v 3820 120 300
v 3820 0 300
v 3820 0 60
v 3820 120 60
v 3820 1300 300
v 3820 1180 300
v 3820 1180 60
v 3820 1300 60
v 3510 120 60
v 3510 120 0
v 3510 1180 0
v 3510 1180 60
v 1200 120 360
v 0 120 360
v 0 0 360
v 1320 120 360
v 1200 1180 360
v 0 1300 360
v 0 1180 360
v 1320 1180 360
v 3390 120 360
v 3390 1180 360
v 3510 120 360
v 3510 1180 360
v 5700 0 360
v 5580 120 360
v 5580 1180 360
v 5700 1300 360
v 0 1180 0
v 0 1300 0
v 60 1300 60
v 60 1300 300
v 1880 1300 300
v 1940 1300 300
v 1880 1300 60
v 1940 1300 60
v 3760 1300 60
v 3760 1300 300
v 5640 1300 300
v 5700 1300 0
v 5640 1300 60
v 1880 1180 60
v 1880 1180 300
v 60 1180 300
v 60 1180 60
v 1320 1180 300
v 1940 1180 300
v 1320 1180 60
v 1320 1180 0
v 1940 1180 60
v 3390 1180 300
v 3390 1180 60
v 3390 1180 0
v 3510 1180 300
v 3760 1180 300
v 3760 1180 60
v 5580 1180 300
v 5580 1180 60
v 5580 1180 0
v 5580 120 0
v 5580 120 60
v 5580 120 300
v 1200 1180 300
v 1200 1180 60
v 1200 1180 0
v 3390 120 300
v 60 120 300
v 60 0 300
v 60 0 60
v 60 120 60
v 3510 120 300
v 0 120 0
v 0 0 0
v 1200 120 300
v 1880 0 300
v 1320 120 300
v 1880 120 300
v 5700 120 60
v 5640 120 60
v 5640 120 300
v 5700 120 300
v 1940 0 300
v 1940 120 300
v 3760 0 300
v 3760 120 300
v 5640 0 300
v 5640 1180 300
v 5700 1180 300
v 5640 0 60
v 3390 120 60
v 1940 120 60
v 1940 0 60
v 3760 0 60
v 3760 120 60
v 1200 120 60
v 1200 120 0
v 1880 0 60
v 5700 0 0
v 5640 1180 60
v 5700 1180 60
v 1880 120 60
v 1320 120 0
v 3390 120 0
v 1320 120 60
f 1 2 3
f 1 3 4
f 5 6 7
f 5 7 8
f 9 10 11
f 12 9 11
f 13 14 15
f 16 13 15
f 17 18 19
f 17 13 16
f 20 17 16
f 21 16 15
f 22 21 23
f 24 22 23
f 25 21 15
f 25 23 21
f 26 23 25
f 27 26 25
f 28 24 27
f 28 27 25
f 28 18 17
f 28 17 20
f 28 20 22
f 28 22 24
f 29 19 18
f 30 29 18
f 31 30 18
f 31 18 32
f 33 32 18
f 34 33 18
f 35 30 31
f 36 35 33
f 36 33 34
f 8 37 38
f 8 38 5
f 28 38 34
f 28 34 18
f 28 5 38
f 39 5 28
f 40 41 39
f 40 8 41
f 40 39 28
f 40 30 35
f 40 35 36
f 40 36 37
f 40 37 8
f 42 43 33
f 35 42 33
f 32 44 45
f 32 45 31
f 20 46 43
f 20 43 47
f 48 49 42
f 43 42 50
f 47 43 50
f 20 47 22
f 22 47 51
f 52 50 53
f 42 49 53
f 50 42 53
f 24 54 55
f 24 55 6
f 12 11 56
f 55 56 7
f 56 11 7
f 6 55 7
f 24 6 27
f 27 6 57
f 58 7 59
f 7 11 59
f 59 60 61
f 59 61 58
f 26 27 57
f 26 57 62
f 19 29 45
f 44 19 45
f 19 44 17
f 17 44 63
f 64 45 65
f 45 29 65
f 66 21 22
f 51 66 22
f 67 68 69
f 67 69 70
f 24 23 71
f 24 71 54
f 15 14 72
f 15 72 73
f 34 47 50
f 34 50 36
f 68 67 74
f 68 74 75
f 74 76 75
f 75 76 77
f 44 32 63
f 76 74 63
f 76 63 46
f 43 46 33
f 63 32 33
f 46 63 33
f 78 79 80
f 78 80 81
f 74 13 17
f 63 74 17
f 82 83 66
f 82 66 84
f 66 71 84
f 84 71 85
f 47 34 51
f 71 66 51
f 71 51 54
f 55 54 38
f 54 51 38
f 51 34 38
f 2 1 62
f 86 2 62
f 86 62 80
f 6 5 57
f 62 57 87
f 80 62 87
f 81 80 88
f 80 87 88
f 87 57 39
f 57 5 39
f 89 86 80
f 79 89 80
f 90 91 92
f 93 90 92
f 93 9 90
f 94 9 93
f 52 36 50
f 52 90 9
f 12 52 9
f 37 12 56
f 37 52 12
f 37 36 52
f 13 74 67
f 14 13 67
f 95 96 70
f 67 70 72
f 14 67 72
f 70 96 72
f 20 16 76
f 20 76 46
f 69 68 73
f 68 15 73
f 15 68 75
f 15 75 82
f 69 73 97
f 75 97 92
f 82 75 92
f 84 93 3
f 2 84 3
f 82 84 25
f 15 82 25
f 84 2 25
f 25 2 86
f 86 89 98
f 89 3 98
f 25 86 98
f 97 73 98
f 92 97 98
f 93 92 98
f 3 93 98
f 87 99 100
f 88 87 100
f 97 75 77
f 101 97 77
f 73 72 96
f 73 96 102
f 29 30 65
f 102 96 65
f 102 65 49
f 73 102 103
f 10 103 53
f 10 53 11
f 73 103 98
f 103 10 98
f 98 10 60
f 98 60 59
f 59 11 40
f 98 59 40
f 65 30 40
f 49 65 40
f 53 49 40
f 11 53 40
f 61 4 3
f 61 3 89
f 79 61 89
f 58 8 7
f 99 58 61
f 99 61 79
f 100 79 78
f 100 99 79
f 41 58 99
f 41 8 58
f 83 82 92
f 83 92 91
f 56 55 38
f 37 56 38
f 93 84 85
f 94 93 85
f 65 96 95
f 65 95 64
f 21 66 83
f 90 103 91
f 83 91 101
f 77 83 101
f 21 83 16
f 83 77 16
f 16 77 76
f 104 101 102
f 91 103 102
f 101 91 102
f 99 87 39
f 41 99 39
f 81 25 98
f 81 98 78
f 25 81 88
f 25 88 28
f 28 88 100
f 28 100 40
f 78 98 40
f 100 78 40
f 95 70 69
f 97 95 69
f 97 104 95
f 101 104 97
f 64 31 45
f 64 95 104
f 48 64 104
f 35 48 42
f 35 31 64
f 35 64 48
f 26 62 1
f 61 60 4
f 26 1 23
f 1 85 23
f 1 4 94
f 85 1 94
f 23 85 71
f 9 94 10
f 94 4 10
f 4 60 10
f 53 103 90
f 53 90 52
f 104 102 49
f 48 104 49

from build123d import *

# Parameters (mm, degrees)
F0_W     = 120
F0_H     = 1060
F1_DEPTH = 60
F2_W     = 60
F2_H     = 120
F3_DEPTH = 300
F4_W     = 120
F4_H     = 1060
F5_DEPTH = 60


with BuildPart() as f1:
    # F0 (on Top) → F1 (new body)
    with BuildSketch(Plane.XY):
        Polygon((5580, 1180), (5700, 1180), (5700, 1300), (0, 1300), (0, 1180), (1200, 1180), (1320, 1180), (3390, 1180), (3510, 1180), align=None)
        Polygon((0, 120), (0, 0), (5700, 0), (5700, 120), (5580, 120), (3510, 120), (3390, 120), (1320, 120), (1200, 120), align=None)
        with Locations((1260, 650)):
            Rectangle(F0_W, F0_H)
        with Locations((3450, 650)):
            Rectangle(F0_W, F0_H)
        with Locations((5640, 650)):
            Rectangle(F0_W, F0_H)
    extrude(amount=F1_DEPTH)

    # F2 (on face) → F3 (join)
    with BuildSketch(Plane.XY.offset(60)):
        with Locations((30, 1240)):
            Rectangle(F2_W, F2_H)
        with Locations((30, 60)):
            Rectangle(F2_W, F2_H)
        with Locations((1910, 1240)):
            Rectangle(F2_W, F2_H)
        with Locations((1910, 60)):
            Rectangle(F2_W, F2_H)
        with Locations((3790, 1240)):
            Rectangle(F2_W, F2_H)
        with Locations((3790, 60)):
            Rectangle(F2_W, F2_H)
        with Locations((5670, 1240)):
            Rectangle(F2_W, F2_H)
        with Locations((5670, 60)):
            Rectangle(F2_W, F2_H)
    extrude(amount=F3_DEPTH)

    # F4 (on face) → F5 (join)
    with BuildSketch(Plane.XY.offset(360)):
        Polygon((60, 1300), (0, 1300), (0, 1180), (60, 1180), (1200, 1180), (1320, 1180), (3390, 1180), (3510, 1180), (5580, 1180), (5580, 120), (3510, 120), (3390, 120), (1320, 120), (1200, 120), (0, 120), (0, 0), (5700, 0), (5700, 1300), align=None)
        with Locations((1260, 650)):
            Rectangle(F4_W, F4_H)
        with Locations((3450, 650)):
            Rectangle(F4_W, F4_H)
    extrude(amount=-F5_DEPTH)


solid = f1.part
